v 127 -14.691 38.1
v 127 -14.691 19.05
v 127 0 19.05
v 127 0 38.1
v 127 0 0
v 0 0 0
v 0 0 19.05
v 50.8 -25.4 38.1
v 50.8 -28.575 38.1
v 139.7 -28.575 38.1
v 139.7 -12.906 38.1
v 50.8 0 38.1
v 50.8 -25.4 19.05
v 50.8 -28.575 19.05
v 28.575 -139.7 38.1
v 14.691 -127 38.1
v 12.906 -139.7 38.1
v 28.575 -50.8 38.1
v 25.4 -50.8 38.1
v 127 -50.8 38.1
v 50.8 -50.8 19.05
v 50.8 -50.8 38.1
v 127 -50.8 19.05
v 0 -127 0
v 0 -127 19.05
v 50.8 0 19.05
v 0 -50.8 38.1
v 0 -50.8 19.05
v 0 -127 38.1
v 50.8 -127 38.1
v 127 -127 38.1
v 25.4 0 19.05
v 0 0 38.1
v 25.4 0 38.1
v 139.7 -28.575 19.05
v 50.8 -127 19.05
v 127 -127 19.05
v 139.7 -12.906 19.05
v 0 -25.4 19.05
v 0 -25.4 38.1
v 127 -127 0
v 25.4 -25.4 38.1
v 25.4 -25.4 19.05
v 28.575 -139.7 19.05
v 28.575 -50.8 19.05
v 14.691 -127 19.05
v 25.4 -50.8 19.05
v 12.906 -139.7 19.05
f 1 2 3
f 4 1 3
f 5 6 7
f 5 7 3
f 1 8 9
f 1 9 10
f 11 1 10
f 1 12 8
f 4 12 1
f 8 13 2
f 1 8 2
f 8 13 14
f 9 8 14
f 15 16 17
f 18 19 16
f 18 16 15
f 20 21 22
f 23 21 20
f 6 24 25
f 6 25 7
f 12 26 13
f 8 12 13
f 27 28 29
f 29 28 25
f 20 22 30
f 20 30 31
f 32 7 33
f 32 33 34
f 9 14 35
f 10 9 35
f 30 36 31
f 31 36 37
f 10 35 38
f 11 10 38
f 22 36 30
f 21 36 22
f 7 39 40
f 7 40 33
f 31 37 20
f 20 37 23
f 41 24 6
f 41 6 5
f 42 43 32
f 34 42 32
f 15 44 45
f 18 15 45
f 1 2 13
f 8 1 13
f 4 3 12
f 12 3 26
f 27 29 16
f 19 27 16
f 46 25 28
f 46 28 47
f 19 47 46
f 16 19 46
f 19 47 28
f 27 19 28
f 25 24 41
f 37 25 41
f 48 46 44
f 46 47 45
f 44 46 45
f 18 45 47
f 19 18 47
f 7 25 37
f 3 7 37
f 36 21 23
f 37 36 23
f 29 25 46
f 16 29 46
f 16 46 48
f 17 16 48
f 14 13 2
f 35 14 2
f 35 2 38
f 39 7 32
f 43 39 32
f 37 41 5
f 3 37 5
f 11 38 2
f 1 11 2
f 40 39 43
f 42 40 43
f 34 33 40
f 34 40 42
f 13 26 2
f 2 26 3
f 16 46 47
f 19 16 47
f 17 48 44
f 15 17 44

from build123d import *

# Parameters (mm, degrees)
F0_W     = 127
F0_H     = 127
F1_DEPTH = 19.05
F2_W     = 25.4
F2_H     = 25.4
F2_W_2   = 76.2
F2_H_2   = 76.2
F3_DEPTH = 19.05
F5_DEPTH = 19.05


with BuildPart() as f1:
    # F0 (on Top) → F1 (new body)
    with BuildSketch(Plane.XY):
        with Locations((63.5, -63.5)):
            Rectangle(F0_W, F0_H)
    extrude(amount=F1_DEPTH)


with BuildPart() as f3:
    # F2 (on face) → F3 (new body)
    with BuildSketch(Plane.XY.offset(19.05)):
        Polygon((127, 0), (50.8, 0), (50.8, -25.4), (127, -14.690788), align=None)
        Polygon((25.4, -50.8), (0, -50.8), (0, -127), (14.690788, -127), align=None)
        with Locations((12.7, -12.7)):
            Rectangle(F2_W, F2_H)
        with Locations((88.9, -88.9)):
            Rectangle(F2_W_2, F2_H_2)
    extrude(amount=F3_DEPTH)


with BuildPart() as f5:
    # F4 (on face) → F5 (new body)
    with BuildSketch(Plane.XY.offset(19.05)):
        Polygon((127, -14.690788), (50.8, -25.4), (50.8, -28.575), (127, -28.575), (127, -25.4), align=None)
        Polygon((28.575, -50.8), (25.4, -50.8), (14.690788, -127), (25.4, -127), (28.575, -127), align=None)
        Polygon((25.4, -127), (14.690788, -127), (12.90592, -139.7), (28.575, -139.7), (28.575, -127), align=None)
        Polygon((139.7, -12.90592), (127, -14.690788), (127, -25.4), (127, -28.575), (139.7, -28.575), align=None)
    extrude(amount=F5_DEPTH)


solid = Compound([f1.part, f3.part, f5.part])
